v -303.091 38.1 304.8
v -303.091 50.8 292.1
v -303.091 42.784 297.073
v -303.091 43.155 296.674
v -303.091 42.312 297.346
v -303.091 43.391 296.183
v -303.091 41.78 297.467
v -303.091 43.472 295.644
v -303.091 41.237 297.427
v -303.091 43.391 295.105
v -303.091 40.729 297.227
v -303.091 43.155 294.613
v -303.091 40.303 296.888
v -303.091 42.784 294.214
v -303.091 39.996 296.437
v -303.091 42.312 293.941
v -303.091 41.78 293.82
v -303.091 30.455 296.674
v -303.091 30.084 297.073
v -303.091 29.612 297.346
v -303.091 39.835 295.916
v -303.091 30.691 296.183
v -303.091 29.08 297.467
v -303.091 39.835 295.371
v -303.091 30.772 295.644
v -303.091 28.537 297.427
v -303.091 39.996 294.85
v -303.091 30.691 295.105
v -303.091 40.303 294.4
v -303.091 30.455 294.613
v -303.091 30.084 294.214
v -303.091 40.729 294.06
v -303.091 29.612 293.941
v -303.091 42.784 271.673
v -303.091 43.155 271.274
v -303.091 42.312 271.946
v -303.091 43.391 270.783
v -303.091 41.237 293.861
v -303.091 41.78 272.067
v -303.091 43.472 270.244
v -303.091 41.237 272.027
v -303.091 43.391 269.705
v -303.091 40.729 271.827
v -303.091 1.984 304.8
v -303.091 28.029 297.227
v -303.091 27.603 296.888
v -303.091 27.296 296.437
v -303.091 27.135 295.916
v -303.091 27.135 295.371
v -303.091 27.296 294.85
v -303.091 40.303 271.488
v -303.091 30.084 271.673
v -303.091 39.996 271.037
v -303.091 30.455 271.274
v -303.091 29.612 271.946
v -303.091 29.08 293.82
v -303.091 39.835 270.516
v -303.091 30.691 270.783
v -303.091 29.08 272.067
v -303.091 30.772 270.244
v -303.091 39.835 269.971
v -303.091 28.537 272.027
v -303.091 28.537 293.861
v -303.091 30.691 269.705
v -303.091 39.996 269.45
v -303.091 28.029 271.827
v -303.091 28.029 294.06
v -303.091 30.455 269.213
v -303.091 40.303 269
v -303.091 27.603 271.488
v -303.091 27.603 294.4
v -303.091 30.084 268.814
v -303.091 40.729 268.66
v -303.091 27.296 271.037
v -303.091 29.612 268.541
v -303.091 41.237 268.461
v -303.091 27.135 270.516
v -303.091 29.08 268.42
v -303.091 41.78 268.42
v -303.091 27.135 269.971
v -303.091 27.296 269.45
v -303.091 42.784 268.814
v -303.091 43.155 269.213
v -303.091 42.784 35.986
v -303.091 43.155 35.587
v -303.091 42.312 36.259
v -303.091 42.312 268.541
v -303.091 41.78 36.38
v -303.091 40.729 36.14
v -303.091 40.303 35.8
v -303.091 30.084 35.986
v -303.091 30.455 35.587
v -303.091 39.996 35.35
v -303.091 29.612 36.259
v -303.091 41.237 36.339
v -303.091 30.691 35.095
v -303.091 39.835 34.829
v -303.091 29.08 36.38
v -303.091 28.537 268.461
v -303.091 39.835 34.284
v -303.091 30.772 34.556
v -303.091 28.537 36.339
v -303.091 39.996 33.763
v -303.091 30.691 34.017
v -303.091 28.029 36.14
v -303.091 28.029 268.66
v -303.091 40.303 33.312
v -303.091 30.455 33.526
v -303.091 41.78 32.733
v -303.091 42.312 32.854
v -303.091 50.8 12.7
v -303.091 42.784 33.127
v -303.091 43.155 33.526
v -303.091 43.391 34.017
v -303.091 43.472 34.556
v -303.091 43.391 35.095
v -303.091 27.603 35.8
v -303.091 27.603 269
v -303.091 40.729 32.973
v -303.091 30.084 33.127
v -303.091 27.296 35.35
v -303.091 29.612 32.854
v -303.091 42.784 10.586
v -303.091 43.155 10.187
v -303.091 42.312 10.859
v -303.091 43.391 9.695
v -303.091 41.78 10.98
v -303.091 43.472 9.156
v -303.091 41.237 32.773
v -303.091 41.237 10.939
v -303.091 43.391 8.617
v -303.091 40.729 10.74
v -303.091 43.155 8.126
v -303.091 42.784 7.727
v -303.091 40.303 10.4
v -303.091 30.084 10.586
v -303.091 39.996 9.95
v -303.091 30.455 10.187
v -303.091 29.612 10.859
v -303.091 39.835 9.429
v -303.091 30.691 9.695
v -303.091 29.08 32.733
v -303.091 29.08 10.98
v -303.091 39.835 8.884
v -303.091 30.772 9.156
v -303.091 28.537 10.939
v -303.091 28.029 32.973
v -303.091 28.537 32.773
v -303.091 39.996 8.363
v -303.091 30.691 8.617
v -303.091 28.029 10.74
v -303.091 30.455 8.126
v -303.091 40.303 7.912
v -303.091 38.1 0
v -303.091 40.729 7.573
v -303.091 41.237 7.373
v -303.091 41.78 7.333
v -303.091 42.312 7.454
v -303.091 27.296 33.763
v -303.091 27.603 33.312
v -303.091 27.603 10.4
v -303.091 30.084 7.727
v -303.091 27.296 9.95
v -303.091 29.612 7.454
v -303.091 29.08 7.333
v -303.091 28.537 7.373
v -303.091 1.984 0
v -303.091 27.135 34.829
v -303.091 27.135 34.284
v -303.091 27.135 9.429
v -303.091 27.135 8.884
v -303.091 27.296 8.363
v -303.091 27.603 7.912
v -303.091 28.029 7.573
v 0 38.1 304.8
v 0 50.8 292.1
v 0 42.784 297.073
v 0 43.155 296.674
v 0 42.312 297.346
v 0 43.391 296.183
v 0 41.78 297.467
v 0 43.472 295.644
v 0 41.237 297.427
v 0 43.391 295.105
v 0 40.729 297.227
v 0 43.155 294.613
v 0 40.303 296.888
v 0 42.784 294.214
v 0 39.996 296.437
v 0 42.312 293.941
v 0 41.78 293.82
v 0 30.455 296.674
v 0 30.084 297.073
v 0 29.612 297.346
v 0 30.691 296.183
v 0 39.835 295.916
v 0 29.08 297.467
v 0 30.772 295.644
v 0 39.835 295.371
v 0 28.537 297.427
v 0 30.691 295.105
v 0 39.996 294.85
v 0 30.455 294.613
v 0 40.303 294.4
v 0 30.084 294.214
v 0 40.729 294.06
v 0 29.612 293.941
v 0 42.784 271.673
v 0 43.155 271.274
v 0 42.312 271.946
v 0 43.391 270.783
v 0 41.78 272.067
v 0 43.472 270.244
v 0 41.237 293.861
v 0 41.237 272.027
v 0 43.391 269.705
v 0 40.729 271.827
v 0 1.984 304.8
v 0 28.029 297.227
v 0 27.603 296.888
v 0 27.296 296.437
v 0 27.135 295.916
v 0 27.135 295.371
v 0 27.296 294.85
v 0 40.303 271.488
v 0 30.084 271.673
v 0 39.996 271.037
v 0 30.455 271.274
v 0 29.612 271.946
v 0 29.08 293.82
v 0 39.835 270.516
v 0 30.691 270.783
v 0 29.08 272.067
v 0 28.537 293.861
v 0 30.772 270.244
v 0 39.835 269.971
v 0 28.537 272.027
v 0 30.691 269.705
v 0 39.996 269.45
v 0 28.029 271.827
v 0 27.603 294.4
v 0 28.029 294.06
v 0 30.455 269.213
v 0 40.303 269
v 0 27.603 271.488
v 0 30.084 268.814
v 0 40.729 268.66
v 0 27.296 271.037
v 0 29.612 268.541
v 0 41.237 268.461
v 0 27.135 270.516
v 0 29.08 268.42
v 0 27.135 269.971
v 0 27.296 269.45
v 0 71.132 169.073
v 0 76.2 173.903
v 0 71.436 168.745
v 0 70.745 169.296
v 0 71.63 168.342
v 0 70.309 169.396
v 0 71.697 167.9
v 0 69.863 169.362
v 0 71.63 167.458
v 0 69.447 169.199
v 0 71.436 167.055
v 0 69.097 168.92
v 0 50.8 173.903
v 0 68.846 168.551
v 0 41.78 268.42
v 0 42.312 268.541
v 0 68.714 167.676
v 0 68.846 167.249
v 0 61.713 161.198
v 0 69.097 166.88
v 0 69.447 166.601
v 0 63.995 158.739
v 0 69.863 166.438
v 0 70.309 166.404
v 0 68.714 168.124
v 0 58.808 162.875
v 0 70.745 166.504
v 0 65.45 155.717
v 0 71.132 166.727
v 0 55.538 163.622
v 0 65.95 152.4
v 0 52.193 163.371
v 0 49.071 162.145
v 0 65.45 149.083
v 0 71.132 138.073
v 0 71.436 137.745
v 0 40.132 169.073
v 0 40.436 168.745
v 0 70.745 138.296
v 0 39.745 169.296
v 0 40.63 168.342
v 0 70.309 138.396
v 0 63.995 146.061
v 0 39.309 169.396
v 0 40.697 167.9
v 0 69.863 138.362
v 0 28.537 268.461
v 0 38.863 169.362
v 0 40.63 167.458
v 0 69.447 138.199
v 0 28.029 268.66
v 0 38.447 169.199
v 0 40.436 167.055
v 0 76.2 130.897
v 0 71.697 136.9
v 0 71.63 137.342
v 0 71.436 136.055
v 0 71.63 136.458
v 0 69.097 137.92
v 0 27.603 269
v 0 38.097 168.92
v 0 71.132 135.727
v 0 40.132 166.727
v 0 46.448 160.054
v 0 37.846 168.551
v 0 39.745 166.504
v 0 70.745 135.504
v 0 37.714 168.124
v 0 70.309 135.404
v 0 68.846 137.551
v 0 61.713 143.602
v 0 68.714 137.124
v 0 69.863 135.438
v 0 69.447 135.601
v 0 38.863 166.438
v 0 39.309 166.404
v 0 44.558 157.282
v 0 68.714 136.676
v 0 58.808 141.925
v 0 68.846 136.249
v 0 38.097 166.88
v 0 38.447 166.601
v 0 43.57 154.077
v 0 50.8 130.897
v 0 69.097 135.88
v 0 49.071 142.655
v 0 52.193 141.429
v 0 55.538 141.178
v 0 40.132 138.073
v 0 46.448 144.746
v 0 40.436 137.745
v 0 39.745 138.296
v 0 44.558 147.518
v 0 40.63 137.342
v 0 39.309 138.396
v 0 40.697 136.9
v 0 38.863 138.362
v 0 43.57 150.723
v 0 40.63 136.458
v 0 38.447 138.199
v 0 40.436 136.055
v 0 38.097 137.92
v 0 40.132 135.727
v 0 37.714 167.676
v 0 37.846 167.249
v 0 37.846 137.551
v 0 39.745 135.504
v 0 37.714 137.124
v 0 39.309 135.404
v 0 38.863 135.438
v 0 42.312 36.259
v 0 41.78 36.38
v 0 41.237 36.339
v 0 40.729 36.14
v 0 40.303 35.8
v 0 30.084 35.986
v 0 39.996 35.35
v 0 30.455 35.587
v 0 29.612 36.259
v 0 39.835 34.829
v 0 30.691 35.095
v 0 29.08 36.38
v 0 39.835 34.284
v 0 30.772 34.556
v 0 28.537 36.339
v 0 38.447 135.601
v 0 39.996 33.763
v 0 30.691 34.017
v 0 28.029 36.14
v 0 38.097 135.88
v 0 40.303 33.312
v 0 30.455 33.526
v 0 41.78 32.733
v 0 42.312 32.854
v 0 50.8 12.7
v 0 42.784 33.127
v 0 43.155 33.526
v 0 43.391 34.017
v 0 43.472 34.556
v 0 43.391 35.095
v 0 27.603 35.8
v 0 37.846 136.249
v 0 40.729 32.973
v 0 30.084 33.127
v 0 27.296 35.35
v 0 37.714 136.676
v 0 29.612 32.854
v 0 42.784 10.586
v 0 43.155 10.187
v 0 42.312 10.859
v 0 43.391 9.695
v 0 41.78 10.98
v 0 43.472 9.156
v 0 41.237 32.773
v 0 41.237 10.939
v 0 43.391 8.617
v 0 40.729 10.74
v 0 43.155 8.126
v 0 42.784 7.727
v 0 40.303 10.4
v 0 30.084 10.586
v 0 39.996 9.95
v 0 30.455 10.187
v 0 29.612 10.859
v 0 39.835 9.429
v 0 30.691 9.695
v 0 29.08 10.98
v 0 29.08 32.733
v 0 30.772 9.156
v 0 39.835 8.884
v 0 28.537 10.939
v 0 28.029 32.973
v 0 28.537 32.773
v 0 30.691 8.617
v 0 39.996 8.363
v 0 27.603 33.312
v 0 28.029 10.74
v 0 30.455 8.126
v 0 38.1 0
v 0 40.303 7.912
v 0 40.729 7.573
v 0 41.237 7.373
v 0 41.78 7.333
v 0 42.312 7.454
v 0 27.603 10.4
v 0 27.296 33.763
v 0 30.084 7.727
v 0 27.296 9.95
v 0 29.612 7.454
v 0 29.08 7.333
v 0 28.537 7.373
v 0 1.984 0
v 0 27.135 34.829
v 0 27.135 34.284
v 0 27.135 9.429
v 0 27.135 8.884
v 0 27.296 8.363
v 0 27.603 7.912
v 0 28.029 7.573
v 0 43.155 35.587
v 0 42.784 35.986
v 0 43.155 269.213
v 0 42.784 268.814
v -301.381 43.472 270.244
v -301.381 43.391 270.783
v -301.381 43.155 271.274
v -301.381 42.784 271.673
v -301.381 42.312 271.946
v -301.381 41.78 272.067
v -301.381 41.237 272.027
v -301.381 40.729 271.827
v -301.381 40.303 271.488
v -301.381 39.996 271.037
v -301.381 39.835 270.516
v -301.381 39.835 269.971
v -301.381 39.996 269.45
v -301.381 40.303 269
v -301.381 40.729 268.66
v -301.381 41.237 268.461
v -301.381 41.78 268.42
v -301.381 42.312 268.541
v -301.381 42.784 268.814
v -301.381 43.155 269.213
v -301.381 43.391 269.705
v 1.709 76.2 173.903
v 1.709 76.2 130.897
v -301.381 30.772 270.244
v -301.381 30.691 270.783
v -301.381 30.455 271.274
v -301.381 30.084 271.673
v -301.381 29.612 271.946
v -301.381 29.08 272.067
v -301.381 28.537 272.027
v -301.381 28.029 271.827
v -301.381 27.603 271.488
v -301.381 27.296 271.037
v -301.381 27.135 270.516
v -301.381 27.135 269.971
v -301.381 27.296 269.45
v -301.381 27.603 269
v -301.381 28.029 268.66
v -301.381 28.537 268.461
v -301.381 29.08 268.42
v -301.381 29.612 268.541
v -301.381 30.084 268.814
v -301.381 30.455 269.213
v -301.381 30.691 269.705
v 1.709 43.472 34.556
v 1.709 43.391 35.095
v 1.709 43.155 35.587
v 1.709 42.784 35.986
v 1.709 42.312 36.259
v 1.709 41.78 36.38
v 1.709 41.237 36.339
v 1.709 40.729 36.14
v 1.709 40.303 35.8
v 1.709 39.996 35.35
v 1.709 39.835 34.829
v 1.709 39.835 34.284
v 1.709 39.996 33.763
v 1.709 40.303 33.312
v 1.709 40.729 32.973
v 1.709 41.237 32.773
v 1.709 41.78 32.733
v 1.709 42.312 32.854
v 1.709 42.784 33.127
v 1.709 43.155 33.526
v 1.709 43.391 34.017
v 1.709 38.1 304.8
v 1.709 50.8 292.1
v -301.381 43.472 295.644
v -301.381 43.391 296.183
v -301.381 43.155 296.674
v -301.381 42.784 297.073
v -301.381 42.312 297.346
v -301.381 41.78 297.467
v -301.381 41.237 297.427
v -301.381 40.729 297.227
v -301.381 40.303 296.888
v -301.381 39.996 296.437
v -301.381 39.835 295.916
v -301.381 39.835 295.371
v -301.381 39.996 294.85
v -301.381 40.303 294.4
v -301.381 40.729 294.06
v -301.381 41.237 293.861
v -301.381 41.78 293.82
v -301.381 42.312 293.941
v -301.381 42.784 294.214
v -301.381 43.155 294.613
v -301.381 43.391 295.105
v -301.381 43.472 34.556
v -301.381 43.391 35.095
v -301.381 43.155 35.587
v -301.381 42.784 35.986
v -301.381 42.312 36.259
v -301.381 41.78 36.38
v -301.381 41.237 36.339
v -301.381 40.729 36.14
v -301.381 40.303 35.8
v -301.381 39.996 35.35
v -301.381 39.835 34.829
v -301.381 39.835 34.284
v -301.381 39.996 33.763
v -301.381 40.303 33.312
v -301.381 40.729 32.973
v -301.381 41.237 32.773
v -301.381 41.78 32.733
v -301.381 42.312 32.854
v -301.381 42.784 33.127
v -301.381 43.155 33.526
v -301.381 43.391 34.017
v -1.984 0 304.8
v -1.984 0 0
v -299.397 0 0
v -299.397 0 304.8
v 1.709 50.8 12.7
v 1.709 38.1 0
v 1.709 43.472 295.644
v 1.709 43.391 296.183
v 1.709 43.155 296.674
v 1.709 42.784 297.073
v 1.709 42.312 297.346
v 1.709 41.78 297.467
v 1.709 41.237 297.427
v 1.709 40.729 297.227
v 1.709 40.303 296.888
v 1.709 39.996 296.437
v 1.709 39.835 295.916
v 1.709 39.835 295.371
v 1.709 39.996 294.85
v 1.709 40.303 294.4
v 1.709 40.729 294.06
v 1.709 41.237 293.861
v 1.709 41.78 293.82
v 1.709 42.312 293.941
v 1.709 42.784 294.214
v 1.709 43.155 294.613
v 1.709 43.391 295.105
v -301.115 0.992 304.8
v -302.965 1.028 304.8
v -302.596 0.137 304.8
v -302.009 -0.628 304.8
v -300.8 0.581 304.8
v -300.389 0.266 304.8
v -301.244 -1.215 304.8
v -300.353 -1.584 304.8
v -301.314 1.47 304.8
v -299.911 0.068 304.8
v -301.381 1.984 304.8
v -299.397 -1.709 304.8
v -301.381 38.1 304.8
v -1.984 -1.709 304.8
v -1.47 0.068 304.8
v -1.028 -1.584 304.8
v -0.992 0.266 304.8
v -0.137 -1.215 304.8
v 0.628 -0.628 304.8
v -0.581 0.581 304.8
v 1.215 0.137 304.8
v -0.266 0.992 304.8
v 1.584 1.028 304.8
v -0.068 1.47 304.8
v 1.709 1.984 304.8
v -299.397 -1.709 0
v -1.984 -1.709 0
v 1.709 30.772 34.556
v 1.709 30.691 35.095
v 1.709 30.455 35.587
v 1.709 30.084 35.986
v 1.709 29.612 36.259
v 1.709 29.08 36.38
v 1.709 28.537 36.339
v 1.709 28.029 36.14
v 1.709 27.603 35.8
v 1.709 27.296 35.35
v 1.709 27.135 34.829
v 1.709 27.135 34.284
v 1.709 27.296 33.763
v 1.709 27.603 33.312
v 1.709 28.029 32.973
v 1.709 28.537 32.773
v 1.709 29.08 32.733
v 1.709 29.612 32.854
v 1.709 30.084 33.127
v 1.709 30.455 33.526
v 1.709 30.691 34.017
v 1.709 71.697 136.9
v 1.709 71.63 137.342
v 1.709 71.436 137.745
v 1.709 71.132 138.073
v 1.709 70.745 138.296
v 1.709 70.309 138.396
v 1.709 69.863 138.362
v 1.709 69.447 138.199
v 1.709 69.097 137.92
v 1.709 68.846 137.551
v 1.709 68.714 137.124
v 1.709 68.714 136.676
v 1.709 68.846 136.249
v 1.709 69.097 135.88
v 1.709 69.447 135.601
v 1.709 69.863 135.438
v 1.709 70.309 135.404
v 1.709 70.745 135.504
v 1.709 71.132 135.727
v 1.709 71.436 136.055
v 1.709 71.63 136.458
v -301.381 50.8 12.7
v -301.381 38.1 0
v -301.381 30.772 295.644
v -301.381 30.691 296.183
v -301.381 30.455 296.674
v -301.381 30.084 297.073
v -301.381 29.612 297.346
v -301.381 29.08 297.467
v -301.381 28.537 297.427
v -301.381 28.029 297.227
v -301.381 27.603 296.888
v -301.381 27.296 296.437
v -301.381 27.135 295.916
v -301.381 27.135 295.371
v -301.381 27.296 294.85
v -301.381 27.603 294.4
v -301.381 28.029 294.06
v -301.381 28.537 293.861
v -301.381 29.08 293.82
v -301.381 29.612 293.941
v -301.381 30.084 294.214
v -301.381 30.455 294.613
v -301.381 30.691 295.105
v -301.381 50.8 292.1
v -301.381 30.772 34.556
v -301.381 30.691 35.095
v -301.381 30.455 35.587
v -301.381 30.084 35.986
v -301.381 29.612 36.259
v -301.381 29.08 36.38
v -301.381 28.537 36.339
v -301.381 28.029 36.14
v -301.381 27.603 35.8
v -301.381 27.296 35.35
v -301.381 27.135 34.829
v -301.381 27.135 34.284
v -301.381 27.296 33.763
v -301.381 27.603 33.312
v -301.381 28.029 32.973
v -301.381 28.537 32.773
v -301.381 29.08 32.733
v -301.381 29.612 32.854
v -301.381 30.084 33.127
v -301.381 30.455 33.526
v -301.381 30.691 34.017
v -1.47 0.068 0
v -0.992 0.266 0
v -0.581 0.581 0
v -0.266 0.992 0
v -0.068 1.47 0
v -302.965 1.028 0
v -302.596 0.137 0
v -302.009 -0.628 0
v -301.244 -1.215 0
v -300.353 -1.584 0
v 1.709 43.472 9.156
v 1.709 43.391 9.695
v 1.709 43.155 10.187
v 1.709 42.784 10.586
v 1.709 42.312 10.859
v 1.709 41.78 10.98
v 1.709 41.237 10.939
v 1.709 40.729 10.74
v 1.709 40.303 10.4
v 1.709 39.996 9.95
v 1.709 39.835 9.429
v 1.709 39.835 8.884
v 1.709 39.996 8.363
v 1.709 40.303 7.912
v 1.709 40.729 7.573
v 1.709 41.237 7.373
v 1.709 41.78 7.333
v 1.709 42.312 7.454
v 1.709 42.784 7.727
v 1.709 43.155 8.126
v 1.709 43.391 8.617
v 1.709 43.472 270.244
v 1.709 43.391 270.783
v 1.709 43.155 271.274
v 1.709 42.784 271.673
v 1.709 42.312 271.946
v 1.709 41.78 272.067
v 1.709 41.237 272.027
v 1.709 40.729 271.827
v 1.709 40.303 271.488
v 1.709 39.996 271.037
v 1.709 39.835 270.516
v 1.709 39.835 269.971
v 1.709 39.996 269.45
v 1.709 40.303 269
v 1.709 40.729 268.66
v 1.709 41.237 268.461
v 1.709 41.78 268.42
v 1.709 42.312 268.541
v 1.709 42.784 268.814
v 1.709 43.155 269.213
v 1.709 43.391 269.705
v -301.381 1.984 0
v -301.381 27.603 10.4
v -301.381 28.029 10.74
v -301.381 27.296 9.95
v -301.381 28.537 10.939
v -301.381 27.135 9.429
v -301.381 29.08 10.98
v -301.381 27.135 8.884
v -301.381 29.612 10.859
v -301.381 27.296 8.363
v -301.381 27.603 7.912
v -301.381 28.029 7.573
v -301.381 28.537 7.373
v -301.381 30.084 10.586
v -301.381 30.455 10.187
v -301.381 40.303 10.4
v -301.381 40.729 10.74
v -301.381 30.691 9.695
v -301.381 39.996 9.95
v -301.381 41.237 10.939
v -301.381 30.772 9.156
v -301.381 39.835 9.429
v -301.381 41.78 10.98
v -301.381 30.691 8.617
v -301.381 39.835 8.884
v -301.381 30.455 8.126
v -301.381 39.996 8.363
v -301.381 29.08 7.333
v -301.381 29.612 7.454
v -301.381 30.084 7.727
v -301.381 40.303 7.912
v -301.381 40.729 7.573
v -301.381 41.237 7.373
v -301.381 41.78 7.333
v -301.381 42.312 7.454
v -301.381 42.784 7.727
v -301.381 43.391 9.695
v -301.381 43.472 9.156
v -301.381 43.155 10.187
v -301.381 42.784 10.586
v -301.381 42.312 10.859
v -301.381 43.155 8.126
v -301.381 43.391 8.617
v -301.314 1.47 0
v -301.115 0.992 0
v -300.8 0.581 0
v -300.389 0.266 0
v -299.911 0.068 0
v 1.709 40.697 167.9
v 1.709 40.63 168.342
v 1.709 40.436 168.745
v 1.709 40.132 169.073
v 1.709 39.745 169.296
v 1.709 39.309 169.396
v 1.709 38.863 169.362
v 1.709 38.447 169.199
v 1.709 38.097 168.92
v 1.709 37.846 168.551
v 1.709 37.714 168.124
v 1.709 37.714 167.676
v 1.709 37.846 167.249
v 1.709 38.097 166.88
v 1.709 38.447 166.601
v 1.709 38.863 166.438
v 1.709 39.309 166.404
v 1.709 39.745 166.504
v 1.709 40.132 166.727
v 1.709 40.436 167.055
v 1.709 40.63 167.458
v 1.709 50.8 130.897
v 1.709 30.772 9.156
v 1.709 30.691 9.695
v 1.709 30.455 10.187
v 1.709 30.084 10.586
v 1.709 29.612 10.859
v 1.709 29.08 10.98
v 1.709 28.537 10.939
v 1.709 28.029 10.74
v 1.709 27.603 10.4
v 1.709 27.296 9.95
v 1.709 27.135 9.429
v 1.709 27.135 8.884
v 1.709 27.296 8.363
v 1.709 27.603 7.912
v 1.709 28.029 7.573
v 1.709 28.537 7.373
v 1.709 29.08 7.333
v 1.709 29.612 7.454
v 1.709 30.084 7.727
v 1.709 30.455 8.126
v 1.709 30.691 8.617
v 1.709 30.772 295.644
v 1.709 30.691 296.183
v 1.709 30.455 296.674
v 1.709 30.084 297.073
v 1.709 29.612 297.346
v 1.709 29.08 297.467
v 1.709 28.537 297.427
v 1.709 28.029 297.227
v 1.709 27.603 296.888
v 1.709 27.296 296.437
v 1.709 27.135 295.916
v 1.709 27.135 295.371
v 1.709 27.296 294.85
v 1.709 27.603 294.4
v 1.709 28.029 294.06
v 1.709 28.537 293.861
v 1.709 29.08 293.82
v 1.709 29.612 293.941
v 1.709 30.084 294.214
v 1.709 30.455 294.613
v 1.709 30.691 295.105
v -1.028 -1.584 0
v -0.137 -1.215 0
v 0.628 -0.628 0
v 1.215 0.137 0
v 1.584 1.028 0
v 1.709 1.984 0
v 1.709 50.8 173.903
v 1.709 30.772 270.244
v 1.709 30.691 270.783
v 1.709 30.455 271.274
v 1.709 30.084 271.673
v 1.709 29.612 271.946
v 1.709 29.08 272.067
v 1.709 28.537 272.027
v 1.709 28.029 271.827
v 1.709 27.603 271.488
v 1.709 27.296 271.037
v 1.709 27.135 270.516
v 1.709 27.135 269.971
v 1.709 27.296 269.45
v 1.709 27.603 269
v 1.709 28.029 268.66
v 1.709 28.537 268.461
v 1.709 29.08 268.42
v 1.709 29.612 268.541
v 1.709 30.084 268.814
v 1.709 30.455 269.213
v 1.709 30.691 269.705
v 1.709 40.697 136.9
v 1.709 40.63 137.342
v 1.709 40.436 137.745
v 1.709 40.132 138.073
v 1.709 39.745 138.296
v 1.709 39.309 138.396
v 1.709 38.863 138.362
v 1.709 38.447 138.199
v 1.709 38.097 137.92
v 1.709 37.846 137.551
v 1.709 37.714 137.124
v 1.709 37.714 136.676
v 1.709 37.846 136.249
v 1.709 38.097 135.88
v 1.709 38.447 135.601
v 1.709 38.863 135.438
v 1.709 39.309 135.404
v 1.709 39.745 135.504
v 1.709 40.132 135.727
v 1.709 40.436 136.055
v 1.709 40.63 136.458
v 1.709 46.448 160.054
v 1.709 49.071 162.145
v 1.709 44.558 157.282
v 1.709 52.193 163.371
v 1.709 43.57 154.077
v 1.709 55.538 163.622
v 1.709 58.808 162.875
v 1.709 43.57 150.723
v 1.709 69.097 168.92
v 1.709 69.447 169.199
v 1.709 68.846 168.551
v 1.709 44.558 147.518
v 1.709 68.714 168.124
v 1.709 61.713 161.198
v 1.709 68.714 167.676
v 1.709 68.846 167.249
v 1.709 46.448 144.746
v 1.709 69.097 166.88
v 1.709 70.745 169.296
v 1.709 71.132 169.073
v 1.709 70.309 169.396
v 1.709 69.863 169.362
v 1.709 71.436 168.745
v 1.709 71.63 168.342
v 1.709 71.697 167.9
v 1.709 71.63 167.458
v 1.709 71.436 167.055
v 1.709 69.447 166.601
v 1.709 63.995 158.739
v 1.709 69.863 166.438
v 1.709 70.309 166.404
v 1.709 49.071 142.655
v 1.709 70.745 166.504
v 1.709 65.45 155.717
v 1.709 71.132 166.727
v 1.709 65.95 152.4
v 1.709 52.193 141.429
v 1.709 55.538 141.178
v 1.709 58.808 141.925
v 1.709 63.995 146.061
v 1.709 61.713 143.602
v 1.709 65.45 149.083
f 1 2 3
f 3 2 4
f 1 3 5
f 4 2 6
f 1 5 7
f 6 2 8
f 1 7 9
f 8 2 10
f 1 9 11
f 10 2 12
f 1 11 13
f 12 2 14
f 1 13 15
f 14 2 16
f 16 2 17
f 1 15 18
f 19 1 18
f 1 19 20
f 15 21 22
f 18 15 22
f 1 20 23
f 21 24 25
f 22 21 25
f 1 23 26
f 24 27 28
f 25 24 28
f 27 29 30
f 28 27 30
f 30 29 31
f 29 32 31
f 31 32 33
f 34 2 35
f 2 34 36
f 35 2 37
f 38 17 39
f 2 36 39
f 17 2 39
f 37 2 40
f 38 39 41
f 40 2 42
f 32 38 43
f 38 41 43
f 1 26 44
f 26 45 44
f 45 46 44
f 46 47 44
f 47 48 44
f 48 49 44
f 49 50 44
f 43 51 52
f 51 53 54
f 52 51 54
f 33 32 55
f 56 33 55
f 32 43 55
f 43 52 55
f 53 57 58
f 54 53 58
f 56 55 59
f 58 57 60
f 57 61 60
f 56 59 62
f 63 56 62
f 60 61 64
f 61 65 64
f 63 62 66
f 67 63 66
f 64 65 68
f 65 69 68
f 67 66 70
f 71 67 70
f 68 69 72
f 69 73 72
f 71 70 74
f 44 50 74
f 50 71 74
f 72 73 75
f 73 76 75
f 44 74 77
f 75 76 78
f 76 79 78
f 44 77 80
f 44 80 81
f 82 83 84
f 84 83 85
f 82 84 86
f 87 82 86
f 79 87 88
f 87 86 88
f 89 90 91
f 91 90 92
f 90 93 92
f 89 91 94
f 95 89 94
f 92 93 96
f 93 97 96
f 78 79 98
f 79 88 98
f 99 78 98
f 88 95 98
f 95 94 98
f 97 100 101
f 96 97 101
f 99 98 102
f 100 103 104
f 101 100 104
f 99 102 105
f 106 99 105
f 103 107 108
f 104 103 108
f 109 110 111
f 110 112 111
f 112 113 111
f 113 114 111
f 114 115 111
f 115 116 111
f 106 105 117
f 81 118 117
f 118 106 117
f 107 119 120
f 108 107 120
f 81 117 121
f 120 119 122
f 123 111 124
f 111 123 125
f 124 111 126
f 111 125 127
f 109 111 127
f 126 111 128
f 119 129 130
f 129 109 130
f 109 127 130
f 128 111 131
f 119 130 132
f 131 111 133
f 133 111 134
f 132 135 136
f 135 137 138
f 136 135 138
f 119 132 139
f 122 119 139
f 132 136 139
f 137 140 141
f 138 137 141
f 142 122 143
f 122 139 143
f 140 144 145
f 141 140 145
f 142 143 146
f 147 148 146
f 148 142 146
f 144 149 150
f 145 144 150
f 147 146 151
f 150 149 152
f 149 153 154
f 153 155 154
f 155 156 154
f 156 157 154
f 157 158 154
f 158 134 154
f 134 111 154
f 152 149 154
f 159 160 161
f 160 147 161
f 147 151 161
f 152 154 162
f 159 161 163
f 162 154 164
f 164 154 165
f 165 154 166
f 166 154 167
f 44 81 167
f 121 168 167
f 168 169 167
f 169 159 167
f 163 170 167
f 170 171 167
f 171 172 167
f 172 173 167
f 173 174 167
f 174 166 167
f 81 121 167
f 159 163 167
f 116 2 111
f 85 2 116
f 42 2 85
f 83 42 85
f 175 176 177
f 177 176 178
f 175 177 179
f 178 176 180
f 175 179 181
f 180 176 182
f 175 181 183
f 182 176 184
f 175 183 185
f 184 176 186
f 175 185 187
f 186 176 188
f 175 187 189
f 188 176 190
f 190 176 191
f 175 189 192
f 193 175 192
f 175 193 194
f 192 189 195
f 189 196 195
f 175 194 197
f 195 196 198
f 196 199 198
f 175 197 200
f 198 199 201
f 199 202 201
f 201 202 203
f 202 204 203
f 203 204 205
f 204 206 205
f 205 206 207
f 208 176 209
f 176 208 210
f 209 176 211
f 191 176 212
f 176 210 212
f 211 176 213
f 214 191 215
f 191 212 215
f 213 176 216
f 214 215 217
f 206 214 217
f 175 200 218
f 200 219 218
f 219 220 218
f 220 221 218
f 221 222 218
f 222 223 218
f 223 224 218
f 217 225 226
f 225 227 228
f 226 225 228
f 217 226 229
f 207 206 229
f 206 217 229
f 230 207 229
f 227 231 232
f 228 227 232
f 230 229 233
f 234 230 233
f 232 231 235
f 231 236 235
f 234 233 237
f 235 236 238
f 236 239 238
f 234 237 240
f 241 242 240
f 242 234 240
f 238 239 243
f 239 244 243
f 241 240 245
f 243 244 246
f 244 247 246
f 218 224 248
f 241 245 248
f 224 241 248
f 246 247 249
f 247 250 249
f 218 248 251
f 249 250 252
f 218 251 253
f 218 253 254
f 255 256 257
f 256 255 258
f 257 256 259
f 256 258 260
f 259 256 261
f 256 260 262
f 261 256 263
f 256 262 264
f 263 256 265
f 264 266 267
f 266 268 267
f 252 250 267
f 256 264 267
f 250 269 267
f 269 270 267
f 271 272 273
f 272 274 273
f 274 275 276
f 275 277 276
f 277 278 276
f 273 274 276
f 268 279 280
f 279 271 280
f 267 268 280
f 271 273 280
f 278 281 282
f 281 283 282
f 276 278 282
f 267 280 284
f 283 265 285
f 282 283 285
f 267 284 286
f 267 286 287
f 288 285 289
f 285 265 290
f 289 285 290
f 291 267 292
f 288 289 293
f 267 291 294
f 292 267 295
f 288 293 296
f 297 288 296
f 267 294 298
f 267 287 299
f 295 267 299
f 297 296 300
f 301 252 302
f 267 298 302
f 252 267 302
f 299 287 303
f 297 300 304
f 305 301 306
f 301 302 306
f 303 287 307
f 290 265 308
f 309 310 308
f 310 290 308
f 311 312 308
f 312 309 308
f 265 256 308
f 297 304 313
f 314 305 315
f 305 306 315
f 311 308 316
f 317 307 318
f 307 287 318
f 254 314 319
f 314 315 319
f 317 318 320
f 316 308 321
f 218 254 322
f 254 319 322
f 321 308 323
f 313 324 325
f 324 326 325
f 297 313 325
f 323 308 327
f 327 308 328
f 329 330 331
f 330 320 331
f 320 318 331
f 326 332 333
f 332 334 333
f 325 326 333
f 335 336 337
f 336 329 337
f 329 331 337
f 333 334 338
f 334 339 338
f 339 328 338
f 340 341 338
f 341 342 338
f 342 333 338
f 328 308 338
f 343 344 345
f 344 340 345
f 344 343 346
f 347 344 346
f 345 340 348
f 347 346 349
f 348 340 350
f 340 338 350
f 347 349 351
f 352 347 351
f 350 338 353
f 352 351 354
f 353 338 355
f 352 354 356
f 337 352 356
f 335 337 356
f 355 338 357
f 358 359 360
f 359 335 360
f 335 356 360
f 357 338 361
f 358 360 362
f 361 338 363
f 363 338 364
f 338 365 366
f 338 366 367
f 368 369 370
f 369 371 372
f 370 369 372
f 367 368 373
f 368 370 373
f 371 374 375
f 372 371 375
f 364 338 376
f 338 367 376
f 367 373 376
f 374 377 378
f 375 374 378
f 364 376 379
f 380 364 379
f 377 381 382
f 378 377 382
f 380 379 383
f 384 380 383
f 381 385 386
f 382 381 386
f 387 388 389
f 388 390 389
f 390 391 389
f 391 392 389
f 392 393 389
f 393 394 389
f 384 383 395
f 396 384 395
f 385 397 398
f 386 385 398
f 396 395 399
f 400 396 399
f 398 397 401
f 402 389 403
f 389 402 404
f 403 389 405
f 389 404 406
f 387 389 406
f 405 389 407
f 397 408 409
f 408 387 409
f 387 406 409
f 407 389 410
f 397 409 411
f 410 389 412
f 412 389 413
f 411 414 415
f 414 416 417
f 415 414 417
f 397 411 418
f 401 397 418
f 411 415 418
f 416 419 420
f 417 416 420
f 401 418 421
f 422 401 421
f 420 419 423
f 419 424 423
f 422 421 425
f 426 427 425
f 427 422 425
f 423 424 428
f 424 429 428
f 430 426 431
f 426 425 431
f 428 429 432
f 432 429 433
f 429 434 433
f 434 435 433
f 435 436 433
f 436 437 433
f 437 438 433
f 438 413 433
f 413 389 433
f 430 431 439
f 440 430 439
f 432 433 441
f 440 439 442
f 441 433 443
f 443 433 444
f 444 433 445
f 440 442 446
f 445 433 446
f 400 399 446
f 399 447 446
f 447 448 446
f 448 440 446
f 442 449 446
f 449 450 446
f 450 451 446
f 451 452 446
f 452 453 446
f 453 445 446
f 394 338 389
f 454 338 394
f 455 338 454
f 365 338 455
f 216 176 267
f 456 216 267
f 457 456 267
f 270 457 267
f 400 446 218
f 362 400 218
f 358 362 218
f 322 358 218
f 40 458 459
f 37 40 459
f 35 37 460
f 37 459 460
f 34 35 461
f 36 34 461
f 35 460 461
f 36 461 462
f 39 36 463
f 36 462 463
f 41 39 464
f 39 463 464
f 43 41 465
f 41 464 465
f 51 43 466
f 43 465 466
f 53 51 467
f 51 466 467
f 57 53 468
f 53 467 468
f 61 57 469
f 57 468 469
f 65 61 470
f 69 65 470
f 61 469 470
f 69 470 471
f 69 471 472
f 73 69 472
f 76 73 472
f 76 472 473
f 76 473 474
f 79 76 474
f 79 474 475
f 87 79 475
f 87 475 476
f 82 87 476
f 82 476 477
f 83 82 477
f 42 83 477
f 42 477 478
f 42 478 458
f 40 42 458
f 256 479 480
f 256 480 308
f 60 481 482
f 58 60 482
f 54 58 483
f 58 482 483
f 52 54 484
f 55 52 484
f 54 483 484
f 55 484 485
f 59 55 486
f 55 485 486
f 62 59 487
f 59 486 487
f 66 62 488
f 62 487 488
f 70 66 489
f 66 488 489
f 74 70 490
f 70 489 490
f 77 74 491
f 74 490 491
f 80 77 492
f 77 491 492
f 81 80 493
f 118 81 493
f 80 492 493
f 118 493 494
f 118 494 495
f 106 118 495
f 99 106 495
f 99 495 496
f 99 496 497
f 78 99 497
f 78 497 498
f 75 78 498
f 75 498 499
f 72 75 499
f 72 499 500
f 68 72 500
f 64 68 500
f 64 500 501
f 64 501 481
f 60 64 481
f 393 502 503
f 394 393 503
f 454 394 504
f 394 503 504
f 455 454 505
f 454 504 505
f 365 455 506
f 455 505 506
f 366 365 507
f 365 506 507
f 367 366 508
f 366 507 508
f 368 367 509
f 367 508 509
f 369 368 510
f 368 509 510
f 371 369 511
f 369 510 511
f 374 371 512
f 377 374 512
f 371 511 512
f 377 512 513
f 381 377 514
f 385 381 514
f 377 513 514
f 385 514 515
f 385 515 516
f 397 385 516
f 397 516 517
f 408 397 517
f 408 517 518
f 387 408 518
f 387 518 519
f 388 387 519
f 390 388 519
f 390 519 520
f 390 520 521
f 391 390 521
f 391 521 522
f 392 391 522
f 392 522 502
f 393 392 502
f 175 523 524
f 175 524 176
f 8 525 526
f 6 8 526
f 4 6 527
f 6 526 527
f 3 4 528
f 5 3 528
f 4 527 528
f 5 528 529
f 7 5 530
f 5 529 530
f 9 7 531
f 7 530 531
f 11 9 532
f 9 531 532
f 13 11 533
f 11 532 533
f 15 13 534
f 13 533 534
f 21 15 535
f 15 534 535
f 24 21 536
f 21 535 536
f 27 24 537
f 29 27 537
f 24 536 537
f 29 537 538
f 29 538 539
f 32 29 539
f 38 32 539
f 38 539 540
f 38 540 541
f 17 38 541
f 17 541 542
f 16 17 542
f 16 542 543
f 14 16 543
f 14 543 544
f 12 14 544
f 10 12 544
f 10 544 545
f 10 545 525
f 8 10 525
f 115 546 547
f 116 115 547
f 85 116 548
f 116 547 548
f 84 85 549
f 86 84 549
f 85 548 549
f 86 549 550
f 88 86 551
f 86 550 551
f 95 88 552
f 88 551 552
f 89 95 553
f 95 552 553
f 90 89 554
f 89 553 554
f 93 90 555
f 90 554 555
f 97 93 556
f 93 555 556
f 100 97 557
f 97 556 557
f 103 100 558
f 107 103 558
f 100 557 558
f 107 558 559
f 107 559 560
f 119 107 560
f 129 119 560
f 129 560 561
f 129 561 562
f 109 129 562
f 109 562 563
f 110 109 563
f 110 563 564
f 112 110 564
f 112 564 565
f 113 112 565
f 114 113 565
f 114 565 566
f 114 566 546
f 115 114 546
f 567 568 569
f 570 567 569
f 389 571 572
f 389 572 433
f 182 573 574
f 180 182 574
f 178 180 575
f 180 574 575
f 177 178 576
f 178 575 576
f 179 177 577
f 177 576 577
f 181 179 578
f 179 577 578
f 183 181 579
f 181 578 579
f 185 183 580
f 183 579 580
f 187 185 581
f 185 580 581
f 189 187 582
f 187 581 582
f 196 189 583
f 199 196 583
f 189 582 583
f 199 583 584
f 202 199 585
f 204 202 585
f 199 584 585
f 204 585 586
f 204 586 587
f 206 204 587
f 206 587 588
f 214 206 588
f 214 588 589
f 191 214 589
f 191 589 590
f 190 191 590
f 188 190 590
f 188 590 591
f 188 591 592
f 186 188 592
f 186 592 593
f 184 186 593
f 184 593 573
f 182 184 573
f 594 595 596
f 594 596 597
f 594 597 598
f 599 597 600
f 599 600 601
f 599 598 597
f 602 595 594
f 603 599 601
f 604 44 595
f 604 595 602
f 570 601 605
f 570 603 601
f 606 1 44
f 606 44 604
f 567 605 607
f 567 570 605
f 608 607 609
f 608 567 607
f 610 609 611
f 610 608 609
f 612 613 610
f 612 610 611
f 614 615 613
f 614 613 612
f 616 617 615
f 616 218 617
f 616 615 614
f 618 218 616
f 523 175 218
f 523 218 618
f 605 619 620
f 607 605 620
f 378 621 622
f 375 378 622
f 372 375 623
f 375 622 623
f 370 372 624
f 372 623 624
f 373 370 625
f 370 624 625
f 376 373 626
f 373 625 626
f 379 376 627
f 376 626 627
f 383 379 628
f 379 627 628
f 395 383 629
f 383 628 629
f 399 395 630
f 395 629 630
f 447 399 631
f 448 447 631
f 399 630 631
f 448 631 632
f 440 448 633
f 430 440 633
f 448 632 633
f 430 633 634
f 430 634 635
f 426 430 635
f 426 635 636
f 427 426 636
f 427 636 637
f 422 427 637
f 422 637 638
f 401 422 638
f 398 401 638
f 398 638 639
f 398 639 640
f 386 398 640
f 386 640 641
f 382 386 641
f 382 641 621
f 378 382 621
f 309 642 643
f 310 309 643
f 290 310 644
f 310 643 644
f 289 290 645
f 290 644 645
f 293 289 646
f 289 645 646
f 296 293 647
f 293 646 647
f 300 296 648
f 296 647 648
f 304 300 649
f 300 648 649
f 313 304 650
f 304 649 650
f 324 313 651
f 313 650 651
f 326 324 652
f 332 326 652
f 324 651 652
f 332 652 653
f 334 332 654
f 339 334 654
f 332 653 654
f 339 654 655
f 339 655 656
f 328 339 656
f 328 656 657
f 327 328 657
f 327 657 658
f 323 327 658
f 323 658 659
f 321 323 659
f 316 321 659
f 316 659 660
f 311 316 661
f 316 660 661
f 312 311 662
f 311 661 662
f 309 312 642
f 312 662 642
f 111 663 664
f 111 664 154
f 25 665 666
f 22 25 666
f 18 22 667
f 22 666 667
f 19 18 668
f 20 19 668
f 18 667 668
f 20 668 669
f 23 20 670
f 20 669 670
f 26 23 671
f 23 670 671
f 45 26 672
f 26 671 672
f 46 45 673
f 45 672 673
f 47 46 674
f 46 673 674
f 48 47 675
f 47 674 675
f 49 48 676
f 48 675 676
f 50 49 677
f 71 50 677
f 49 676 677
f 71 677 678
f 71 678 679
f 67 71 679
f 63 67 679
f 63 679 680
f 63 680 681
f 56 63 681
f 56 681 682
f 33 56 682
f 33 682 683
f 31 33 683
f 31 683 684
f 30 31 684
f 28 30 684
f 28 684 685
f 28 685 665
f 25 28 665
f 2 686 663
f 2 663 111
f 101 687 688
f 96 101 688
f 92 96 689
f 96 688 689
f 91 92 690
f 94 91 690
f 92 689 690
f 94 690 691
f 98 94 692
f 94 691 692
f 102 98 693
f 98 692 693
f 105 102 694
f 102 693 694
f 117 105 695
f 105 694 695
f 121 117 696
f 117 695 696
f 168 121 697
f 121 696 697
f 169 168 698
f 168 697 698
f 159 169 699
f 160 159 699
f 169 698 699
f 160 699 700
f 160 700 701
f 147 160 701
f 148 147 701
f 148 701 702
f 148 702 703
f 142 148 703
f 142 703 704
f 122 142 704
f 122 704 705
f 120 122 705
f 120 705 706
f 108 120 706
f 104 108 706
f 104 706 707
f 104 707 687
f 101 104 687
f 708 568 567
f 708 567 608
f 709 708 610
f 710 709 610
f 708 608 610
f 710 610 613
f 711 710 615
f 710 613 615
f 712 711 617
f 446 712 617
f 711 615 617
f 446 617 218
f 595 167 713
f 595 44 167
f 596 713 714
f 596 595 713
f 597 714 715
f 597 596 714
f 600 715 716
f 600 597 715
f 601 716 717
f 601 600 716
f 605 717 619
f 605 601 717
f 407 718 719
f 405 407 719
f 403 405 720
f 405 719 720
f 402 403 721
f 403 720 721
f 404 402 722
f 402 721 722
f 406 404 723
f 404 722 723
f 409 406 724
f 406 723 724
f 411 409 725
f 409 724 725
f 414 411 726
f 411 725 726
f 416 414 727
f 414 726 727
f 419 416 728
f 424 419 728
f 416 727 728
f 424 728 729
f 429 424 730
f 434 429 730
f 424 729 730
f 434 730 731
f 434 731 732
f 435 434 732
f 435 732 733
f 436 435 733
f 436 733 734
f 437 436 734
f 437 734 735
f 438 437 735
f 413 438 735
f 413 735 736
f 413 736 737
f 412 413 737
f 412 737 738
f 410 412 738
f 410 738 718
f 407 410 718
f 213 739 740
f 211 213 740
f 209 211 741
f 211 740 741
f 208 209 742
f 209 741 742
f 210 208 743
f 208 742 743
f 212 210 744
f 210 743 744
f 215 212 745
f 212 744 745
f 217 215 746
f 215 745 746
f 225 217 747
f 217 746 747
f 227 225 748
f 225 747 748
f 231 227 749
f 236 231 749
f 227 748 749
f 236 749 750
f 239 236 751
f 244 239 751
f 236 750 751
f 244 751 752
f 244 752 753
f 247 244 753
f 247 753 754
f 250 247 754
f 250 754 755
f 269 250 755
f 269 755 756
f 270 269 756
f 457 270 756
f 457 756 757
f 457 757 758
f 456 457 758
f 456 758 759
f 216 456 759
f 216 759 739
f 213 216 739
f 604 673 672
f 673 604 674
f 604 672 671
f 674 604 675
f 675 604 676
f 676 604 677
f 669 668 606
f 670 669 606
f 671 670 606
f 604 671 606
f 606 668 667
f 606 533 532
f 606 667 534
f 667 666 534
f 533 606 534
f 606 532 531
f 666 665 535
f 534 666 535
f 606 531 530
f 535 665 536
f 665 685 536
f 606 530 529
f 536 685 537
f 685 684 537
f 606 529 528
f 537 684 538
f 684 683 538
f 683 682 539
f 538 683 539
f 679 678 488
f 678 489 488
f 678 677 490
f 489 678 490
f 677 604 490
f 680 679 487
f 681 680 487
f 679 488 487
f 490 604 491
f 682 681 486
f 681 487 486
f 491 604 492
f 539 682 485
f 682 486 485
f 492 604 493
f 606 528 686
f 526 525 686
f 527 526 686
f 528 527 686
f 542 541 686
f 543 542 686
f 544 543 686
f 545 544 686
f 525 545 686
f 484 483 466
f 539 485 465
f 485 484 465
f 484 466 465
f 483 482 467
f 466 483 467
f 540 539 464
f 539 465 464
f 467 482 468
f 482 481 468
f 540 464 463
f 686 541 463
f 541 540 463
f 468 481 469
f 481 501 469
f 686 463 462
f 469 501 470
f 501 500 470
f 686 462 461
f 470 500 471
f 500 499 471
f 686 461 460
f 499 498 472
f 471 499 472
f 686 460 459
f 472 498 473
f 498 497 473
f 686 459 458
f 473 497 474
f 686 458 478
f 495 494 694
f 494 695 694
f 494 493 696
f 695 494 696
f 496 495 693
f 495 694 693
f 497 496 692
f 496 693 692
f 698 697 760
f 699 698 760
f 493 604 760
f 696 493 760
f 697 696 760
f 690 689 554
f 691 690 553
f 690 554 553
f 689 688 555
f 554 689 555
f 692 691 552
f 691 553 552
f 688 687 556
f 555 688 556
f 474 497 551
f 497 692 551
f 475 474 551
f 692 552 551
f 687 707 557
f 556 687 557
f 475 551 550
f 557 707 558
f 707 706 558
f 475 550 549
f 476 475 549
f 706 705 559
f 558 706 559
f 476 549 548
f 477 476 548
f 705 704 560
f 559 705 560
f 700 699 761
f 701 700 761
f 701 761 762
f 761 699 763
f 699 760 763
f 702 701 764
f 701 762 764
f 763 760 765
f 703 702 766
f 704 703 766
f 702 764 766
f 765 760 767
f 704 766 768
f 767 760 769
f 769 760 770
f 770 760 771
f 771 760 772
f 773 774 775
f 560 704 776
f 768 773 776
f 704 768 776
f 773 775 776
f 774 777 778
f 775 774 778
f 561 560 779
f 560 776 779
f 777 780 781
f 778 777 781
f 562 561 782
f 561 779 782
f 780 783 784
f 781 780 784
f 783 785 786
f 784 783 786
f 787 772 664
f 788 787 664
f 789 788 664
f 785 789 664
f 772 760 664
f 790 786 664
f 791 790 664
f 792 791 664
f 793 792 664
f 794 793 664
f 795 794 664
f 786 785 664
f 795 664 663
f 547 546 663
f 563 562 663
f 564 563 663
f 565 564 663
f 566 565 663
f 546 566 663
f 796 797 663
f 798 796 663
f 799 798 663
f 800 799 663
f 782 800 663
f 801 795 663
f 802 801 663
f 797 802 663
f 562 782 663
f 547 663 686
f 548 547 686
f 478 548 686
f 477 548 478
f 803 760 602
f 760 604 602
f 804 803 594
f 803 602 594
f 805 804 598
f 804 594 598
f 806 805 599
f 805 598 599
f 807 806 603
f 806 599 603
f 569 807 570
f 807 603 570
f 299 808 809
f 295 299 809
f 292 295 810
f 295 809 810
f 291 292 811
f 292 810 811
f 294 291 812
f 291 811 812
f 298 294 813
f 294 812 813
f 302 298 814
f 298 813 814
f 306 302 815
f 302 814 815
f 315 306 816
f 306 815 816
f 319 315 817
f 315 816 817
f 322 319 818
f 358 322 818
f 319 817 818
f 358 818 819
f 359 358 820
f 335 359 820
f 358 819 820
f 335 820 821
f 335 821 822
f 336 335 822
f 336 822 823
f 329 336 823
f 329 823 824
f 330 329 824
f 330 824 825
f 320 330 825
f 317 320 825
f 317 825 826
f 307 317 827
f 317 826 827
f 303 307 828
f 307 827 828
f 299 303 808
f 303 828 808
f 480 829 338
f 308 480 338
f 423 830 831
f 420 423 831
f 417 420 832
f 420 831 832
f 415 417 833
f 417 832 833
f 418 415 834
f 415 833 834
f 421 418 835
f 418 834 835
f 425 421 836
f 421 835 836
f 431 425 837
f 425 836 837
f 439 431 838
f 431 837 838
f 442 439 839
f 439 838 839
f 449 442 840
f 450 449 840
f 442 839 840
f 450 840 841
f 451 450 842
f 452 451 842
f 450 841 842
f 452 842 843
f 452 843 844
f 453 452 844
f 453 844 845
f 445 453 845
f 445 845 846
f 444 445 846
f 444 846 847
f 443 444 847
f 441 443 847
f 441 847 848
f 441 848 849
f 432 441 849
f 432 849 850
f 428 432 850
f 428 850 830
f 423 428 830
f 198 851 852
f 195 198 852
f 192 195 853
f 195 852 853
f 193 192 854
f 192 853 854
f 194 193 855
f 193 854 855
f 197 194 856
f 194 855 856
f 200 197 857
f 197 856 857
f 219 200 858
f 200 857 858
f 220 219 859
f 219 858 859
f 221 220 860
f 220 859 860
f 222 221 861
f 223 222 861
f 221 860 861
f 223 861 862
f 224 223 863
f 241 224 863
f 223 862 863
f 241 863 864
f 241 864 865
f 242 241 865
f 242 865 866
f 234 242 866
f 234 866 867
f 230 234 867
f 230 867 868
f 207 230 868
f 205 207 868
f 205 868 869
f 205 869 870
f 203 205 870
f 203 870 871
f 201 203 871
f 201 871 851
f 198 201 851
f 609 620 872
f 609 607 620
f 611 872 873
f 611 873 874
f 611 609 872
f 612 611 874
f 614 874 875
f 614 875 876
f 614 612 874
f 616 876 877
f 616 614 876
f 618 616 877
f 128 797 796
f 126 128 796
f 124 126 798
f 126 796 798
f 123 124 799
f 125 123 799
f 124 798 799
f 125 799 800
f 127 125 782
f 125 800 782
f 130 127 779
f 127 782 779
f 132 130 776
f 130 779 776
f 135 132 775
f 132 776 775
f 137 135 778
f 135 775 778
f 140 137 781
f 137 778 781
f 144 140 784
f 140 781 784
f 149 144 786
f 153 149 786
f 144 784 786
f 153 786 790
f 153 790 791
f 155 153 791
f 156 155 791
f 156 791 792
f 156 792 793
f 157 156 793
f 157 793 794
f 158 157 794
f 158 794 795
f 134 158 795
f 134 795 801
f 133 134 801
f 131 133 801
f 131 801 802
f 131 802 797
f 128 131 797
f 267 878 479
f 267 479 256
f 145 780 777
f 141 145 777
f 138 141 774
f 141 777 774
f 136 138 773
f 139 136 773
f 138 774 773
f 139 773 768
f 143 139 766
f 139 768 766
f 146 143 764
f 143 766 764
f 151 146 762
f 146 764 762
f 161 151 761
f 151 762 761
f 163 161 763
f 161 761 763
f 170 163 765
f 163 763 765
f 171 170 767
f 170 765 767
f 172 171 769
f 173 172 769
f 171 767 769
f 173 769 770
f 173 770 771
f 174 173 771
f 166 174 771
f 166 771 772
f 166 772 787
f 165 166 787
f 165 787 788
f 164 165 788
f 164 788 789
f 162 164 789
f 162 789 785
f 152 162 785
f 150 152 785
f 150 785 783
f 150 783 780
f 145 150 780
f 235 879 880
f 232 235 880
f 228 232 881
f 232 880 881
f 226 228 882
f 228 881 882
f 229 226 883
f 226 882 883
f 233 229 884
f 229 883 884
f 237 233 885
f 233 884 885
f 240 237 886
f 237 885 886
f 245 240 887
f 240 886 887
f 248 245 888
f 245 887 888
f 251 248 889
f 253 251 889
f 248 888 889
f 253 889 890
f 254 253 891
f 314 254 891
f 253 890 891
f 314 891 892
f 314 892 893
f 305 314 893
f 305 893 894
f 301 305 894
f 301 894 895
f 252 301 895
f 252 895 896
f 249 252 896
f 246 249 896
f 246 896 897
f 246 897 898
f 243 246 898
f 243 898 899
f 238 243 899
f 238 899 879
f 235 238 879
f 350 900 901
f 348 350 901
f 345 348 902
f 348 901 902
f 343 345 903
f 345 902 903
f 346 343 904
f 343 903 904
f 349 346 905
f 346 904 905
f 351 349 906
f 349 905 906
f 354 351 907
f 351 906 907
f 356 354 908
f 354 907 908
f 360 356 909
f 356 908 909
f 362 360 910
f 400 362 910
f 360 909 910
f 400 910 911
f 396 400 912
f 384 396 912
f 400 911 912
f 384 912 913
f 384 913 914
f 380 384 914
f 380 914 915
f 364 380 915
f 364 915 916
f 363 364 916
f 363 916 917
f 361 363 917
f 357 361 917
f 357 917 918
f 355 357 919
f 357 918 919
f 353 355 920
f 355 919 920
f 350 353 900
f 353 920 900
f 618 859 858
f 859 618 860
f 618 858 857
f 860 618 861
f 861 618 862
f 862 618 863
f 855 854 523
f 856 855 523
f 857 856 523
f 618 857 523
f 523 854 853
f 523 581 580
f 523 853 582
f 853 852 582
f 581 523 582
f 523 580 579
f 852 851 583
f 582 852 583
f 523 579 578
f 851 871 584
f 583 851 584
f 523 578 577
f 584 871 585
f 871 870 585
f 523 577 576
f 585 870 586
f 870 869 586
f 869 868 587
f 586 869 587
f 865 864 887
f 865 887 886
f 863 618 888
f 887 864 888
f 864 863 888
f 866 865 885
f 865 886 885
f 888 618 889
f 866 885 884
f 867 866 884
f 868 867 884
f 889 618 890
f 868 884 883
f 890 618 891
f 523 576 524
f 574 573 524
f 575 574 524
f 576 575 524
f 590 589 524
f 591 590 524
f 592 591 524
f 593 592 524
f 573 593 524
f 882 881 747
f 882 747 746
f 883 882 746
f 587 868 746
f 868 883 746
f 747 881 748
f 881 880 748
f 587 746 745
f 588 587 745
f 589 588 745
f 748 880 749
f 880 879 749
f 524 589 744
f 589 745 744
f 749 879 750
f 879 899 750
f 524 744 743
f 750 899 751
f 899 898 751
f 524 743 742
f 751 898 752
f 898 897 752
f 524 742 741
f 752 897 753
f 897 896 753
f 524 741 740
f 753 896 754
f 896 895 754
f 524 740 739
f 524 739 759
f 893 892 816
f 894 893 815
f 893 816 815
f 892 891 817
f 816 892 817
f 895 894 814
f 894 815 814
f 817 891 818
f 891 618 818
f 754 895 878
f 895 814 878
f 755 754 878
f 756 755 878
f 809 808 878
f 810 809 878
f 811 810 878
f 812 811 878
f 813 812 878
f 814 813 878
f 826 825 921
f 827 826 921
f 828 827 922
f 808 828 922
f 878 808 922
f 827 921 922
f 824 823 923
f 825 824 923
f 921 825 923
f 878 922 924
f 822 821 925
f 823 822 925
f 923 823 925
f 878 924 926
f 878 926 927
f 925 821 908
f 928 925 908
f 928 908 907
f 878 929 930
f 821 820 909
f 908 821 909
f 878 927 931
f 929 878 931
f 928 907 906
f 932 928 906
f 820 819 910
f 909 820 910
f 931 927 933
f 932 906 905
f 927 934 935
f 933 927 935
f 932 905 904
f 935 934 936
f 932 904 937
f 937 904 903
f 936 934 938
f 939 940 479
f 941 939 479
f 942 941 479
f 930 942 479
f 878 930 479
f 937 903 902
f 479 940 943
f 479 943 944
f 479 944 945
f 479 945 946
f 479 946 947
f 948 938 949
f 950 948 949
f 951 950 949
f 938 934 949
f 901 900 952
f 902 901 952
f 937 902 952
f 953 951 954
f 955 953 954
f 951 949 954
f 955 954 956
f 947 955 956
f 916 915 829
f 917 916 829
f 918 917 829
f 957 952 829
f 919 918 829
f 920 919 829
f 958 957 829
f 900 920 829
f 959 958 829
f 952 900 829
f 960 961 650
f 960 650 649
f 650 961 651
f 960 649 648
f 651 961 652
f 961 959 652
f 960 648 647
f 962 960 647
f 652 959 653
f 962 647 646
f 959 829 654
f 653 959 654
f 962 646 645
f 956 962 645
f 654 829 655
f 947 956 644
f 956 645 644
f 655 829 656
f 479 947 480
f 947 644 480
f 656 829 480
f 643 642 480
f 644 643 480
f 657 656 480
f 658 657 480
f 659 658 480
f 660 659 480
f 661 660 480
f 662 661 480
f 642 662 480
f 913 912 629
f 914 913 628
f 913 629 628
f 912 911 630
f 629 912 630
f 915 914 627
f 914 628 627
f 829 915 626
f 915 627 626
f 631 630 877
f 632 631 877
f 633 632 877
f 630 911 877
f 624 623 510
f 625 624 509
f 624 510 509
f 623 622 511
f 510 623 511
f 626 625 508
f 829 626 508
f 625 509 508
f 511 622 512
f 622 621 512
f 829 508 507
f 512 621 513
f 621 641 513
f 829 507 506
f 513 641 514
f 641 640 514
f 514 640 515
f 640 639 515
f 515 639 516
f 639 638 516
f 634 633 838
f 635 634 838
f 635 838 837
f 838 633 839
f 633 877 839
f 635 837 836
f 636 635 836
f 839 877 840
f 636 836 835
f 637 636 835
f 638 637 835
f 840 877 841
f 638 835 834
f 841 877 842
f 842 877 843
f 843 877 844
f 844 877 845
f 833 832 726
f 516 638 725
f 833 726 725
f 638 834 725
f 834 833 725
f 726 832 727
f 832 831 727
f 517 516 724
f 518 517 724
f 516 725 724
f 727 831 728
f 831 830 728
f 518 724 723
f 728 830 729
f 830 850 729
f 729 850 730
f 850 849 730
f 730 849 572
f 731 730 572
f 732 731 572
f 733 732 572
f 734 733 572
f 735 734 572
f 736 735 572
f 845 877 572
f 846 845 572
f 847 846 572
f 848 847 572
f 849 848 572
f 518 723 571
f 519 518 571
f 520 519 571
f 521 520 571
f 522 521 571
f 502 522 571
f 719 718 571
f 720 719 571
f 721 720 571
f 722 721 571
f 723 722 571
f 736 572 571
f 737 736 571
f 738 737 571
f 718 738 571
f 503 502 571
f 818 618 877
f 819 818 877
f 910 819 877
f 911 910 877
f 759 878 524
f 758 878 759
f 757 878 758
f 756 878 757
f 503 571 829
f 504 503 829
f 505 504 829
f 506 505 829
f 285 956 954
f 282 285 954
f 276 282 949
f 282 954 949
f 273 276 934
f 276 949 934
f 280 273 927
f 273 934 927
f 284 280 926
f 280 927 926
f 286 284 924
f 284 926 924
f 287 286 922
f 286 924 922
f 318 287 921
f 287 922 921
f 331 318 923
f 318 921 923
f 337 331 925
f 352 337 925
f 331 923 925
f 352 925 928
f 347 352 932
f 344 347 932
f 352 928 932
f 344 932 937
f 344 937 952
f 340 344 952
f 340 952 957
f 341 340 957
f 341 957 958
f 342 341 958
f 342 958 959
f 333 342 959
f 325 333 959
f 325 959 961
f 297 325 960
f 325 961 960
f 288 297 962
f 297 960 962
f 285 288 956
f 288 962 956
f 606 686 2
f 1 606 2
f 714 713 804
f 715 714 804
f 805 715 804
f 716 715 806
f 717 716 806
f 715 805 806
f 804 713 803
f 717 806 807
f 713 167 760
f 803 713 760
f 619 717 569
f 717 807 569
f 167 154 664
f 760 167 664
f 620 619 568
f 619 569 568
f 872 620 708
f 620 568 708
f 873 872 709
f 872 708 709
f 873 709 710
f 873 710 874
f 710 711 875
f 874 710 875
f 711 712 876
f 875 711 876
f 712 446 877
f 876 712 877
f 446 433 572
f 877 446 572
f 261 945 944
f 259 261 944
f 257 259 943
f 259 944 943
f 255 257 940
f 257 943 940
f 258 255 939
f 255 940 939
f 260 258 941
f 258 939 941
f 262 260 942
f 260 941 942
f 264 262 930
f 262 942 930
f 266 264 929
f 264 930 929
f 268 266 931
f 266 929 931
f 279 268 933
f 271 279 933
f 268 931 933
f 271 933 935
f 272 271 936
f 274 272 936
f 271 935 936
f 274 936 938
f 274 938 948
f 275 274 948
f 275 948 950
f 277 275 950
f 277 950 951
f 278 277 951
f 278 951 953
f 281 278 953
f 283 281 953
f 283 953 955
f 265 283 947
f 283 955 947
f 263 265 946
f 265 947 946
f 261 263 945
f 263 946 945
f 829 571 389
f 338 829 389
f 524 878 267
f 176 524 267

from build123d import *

# Parameters (mm, degrees)
F1_DEPTH  = 304.8
F2_R      = 3.69316
F3_R      = 1.98374
F4_W      = 1.70942
F4_H      = 43.0059846
F5_DEPTH  = 25.4
F6_R      = 11.2530001
F6_R_2    = 1.5
F7_DEPTH  = 1.70942
F8_SIZE   = 12.7
F9_R      = 1.8288
F10_DEPTH = 304.8


with BuildPart() as f1:
    # F0 (on Top) → F1 (new body)
    with BuildSketch(Plane.XY):
        Polygon((0, 50.8), (0, 0), (-301.38116, 0), (-301.38116, 50.8), (-303.09058, 50.8), (-303.09058, -1.70942), (1.70942, -1.70942), (1.70942, 50.8), align=None)
    extrude(amount=F1_DEPTH)

    # F2
    f2_edges = [f1.edges().sort_by_distance(p)[0] for p in [
        (1.70942, -1.70942, 152.4),
        (-303.09058, -1.70942, 152.4),
    ]]
    fillet(f2_edges, radius=F2_R)

    # F3
    f3_edges = [f1.edges().sort_by_distance(p)[0] for p in [
        (0, 0, 152.4),
        (-301.38116, 0, 152.4),
    ]]
    fillet(f3_edges, radius=F3_R)

    # F4 (on face) → F5 (join)
    with BuildSketch(Plane(origin=(0, 50.8, 0), x_dir=(-1, 0, 0), z_dir=(0, 1, 0))):
        with Locations((-0.85471, 152.4)):
            Rectangle(F4_W, F4_H)
    extrude(amount=F5_DEPTH)

    # F6 (on face) → F7 (cut, through all)
    with BuildSketch(Plane.YZ.offset(1.70942)):
        with Locations((54.6970077, 152.4)):
            Circle(F6_R)
        with Locations((70.1970021, 136.9000056)):
            Circle(F6_R_2)
        with Locations((39.1970133, 136.9000056)):
            Circle(F6_R_2)
        with Locations((39.1970133, 167.8999944)):
            Circle(F6_R_2)
        with Locations((70.1970021, 167.8999944)):
            Circle(F6_R_2)
    extrude(amount=-F7_DEPTH, mode=Mode.SUBTRACT)

    # F8
    f8_edges = [f1.edges().sort_by_distance(p)[0] for p in [
        (0.85471, 50.8, 0),
        (-302.23587, 50.8, 0),
        (-302.23587, 50.8, 304.8),
        (0.85471, 50.8, 304.8),
    ]]
    chamfer(f8_edges, length=F8_SIZE)

    # F9 (on face) → F10 (cut, through all)
    with BuildSketch(Plane.YZ.offset(1.70942)):
        with Locations((41.6436699622, 295.6436699622)):
            Circle(F9_R)
        with Locations((41.6436699622, 270.2436699622)):
            Circle(F9_R)
        with Locations((28.9436699622, 270.2436699622)):
            Circle(F9_R)
        with Locations((28.9436699622, 295.6436699622)):
            Circle(F9_R)
        with Locations((41.6436699622, 34.5563300378)):
            Circle(F9_R)
        with Locations((41.6436699622, 9.1563300378)):
            Circle(F9_R)
        with Locations((28.9436699622, 9.1563300378)):
            Circle(F9_R)
        with Locations((28.9436699622, 34.5563300378)):
            Circle(F9_R)
    extrude(amount=-F10_DEPTH, mode=Mode.SUBTRACT)


solid = f1.part
